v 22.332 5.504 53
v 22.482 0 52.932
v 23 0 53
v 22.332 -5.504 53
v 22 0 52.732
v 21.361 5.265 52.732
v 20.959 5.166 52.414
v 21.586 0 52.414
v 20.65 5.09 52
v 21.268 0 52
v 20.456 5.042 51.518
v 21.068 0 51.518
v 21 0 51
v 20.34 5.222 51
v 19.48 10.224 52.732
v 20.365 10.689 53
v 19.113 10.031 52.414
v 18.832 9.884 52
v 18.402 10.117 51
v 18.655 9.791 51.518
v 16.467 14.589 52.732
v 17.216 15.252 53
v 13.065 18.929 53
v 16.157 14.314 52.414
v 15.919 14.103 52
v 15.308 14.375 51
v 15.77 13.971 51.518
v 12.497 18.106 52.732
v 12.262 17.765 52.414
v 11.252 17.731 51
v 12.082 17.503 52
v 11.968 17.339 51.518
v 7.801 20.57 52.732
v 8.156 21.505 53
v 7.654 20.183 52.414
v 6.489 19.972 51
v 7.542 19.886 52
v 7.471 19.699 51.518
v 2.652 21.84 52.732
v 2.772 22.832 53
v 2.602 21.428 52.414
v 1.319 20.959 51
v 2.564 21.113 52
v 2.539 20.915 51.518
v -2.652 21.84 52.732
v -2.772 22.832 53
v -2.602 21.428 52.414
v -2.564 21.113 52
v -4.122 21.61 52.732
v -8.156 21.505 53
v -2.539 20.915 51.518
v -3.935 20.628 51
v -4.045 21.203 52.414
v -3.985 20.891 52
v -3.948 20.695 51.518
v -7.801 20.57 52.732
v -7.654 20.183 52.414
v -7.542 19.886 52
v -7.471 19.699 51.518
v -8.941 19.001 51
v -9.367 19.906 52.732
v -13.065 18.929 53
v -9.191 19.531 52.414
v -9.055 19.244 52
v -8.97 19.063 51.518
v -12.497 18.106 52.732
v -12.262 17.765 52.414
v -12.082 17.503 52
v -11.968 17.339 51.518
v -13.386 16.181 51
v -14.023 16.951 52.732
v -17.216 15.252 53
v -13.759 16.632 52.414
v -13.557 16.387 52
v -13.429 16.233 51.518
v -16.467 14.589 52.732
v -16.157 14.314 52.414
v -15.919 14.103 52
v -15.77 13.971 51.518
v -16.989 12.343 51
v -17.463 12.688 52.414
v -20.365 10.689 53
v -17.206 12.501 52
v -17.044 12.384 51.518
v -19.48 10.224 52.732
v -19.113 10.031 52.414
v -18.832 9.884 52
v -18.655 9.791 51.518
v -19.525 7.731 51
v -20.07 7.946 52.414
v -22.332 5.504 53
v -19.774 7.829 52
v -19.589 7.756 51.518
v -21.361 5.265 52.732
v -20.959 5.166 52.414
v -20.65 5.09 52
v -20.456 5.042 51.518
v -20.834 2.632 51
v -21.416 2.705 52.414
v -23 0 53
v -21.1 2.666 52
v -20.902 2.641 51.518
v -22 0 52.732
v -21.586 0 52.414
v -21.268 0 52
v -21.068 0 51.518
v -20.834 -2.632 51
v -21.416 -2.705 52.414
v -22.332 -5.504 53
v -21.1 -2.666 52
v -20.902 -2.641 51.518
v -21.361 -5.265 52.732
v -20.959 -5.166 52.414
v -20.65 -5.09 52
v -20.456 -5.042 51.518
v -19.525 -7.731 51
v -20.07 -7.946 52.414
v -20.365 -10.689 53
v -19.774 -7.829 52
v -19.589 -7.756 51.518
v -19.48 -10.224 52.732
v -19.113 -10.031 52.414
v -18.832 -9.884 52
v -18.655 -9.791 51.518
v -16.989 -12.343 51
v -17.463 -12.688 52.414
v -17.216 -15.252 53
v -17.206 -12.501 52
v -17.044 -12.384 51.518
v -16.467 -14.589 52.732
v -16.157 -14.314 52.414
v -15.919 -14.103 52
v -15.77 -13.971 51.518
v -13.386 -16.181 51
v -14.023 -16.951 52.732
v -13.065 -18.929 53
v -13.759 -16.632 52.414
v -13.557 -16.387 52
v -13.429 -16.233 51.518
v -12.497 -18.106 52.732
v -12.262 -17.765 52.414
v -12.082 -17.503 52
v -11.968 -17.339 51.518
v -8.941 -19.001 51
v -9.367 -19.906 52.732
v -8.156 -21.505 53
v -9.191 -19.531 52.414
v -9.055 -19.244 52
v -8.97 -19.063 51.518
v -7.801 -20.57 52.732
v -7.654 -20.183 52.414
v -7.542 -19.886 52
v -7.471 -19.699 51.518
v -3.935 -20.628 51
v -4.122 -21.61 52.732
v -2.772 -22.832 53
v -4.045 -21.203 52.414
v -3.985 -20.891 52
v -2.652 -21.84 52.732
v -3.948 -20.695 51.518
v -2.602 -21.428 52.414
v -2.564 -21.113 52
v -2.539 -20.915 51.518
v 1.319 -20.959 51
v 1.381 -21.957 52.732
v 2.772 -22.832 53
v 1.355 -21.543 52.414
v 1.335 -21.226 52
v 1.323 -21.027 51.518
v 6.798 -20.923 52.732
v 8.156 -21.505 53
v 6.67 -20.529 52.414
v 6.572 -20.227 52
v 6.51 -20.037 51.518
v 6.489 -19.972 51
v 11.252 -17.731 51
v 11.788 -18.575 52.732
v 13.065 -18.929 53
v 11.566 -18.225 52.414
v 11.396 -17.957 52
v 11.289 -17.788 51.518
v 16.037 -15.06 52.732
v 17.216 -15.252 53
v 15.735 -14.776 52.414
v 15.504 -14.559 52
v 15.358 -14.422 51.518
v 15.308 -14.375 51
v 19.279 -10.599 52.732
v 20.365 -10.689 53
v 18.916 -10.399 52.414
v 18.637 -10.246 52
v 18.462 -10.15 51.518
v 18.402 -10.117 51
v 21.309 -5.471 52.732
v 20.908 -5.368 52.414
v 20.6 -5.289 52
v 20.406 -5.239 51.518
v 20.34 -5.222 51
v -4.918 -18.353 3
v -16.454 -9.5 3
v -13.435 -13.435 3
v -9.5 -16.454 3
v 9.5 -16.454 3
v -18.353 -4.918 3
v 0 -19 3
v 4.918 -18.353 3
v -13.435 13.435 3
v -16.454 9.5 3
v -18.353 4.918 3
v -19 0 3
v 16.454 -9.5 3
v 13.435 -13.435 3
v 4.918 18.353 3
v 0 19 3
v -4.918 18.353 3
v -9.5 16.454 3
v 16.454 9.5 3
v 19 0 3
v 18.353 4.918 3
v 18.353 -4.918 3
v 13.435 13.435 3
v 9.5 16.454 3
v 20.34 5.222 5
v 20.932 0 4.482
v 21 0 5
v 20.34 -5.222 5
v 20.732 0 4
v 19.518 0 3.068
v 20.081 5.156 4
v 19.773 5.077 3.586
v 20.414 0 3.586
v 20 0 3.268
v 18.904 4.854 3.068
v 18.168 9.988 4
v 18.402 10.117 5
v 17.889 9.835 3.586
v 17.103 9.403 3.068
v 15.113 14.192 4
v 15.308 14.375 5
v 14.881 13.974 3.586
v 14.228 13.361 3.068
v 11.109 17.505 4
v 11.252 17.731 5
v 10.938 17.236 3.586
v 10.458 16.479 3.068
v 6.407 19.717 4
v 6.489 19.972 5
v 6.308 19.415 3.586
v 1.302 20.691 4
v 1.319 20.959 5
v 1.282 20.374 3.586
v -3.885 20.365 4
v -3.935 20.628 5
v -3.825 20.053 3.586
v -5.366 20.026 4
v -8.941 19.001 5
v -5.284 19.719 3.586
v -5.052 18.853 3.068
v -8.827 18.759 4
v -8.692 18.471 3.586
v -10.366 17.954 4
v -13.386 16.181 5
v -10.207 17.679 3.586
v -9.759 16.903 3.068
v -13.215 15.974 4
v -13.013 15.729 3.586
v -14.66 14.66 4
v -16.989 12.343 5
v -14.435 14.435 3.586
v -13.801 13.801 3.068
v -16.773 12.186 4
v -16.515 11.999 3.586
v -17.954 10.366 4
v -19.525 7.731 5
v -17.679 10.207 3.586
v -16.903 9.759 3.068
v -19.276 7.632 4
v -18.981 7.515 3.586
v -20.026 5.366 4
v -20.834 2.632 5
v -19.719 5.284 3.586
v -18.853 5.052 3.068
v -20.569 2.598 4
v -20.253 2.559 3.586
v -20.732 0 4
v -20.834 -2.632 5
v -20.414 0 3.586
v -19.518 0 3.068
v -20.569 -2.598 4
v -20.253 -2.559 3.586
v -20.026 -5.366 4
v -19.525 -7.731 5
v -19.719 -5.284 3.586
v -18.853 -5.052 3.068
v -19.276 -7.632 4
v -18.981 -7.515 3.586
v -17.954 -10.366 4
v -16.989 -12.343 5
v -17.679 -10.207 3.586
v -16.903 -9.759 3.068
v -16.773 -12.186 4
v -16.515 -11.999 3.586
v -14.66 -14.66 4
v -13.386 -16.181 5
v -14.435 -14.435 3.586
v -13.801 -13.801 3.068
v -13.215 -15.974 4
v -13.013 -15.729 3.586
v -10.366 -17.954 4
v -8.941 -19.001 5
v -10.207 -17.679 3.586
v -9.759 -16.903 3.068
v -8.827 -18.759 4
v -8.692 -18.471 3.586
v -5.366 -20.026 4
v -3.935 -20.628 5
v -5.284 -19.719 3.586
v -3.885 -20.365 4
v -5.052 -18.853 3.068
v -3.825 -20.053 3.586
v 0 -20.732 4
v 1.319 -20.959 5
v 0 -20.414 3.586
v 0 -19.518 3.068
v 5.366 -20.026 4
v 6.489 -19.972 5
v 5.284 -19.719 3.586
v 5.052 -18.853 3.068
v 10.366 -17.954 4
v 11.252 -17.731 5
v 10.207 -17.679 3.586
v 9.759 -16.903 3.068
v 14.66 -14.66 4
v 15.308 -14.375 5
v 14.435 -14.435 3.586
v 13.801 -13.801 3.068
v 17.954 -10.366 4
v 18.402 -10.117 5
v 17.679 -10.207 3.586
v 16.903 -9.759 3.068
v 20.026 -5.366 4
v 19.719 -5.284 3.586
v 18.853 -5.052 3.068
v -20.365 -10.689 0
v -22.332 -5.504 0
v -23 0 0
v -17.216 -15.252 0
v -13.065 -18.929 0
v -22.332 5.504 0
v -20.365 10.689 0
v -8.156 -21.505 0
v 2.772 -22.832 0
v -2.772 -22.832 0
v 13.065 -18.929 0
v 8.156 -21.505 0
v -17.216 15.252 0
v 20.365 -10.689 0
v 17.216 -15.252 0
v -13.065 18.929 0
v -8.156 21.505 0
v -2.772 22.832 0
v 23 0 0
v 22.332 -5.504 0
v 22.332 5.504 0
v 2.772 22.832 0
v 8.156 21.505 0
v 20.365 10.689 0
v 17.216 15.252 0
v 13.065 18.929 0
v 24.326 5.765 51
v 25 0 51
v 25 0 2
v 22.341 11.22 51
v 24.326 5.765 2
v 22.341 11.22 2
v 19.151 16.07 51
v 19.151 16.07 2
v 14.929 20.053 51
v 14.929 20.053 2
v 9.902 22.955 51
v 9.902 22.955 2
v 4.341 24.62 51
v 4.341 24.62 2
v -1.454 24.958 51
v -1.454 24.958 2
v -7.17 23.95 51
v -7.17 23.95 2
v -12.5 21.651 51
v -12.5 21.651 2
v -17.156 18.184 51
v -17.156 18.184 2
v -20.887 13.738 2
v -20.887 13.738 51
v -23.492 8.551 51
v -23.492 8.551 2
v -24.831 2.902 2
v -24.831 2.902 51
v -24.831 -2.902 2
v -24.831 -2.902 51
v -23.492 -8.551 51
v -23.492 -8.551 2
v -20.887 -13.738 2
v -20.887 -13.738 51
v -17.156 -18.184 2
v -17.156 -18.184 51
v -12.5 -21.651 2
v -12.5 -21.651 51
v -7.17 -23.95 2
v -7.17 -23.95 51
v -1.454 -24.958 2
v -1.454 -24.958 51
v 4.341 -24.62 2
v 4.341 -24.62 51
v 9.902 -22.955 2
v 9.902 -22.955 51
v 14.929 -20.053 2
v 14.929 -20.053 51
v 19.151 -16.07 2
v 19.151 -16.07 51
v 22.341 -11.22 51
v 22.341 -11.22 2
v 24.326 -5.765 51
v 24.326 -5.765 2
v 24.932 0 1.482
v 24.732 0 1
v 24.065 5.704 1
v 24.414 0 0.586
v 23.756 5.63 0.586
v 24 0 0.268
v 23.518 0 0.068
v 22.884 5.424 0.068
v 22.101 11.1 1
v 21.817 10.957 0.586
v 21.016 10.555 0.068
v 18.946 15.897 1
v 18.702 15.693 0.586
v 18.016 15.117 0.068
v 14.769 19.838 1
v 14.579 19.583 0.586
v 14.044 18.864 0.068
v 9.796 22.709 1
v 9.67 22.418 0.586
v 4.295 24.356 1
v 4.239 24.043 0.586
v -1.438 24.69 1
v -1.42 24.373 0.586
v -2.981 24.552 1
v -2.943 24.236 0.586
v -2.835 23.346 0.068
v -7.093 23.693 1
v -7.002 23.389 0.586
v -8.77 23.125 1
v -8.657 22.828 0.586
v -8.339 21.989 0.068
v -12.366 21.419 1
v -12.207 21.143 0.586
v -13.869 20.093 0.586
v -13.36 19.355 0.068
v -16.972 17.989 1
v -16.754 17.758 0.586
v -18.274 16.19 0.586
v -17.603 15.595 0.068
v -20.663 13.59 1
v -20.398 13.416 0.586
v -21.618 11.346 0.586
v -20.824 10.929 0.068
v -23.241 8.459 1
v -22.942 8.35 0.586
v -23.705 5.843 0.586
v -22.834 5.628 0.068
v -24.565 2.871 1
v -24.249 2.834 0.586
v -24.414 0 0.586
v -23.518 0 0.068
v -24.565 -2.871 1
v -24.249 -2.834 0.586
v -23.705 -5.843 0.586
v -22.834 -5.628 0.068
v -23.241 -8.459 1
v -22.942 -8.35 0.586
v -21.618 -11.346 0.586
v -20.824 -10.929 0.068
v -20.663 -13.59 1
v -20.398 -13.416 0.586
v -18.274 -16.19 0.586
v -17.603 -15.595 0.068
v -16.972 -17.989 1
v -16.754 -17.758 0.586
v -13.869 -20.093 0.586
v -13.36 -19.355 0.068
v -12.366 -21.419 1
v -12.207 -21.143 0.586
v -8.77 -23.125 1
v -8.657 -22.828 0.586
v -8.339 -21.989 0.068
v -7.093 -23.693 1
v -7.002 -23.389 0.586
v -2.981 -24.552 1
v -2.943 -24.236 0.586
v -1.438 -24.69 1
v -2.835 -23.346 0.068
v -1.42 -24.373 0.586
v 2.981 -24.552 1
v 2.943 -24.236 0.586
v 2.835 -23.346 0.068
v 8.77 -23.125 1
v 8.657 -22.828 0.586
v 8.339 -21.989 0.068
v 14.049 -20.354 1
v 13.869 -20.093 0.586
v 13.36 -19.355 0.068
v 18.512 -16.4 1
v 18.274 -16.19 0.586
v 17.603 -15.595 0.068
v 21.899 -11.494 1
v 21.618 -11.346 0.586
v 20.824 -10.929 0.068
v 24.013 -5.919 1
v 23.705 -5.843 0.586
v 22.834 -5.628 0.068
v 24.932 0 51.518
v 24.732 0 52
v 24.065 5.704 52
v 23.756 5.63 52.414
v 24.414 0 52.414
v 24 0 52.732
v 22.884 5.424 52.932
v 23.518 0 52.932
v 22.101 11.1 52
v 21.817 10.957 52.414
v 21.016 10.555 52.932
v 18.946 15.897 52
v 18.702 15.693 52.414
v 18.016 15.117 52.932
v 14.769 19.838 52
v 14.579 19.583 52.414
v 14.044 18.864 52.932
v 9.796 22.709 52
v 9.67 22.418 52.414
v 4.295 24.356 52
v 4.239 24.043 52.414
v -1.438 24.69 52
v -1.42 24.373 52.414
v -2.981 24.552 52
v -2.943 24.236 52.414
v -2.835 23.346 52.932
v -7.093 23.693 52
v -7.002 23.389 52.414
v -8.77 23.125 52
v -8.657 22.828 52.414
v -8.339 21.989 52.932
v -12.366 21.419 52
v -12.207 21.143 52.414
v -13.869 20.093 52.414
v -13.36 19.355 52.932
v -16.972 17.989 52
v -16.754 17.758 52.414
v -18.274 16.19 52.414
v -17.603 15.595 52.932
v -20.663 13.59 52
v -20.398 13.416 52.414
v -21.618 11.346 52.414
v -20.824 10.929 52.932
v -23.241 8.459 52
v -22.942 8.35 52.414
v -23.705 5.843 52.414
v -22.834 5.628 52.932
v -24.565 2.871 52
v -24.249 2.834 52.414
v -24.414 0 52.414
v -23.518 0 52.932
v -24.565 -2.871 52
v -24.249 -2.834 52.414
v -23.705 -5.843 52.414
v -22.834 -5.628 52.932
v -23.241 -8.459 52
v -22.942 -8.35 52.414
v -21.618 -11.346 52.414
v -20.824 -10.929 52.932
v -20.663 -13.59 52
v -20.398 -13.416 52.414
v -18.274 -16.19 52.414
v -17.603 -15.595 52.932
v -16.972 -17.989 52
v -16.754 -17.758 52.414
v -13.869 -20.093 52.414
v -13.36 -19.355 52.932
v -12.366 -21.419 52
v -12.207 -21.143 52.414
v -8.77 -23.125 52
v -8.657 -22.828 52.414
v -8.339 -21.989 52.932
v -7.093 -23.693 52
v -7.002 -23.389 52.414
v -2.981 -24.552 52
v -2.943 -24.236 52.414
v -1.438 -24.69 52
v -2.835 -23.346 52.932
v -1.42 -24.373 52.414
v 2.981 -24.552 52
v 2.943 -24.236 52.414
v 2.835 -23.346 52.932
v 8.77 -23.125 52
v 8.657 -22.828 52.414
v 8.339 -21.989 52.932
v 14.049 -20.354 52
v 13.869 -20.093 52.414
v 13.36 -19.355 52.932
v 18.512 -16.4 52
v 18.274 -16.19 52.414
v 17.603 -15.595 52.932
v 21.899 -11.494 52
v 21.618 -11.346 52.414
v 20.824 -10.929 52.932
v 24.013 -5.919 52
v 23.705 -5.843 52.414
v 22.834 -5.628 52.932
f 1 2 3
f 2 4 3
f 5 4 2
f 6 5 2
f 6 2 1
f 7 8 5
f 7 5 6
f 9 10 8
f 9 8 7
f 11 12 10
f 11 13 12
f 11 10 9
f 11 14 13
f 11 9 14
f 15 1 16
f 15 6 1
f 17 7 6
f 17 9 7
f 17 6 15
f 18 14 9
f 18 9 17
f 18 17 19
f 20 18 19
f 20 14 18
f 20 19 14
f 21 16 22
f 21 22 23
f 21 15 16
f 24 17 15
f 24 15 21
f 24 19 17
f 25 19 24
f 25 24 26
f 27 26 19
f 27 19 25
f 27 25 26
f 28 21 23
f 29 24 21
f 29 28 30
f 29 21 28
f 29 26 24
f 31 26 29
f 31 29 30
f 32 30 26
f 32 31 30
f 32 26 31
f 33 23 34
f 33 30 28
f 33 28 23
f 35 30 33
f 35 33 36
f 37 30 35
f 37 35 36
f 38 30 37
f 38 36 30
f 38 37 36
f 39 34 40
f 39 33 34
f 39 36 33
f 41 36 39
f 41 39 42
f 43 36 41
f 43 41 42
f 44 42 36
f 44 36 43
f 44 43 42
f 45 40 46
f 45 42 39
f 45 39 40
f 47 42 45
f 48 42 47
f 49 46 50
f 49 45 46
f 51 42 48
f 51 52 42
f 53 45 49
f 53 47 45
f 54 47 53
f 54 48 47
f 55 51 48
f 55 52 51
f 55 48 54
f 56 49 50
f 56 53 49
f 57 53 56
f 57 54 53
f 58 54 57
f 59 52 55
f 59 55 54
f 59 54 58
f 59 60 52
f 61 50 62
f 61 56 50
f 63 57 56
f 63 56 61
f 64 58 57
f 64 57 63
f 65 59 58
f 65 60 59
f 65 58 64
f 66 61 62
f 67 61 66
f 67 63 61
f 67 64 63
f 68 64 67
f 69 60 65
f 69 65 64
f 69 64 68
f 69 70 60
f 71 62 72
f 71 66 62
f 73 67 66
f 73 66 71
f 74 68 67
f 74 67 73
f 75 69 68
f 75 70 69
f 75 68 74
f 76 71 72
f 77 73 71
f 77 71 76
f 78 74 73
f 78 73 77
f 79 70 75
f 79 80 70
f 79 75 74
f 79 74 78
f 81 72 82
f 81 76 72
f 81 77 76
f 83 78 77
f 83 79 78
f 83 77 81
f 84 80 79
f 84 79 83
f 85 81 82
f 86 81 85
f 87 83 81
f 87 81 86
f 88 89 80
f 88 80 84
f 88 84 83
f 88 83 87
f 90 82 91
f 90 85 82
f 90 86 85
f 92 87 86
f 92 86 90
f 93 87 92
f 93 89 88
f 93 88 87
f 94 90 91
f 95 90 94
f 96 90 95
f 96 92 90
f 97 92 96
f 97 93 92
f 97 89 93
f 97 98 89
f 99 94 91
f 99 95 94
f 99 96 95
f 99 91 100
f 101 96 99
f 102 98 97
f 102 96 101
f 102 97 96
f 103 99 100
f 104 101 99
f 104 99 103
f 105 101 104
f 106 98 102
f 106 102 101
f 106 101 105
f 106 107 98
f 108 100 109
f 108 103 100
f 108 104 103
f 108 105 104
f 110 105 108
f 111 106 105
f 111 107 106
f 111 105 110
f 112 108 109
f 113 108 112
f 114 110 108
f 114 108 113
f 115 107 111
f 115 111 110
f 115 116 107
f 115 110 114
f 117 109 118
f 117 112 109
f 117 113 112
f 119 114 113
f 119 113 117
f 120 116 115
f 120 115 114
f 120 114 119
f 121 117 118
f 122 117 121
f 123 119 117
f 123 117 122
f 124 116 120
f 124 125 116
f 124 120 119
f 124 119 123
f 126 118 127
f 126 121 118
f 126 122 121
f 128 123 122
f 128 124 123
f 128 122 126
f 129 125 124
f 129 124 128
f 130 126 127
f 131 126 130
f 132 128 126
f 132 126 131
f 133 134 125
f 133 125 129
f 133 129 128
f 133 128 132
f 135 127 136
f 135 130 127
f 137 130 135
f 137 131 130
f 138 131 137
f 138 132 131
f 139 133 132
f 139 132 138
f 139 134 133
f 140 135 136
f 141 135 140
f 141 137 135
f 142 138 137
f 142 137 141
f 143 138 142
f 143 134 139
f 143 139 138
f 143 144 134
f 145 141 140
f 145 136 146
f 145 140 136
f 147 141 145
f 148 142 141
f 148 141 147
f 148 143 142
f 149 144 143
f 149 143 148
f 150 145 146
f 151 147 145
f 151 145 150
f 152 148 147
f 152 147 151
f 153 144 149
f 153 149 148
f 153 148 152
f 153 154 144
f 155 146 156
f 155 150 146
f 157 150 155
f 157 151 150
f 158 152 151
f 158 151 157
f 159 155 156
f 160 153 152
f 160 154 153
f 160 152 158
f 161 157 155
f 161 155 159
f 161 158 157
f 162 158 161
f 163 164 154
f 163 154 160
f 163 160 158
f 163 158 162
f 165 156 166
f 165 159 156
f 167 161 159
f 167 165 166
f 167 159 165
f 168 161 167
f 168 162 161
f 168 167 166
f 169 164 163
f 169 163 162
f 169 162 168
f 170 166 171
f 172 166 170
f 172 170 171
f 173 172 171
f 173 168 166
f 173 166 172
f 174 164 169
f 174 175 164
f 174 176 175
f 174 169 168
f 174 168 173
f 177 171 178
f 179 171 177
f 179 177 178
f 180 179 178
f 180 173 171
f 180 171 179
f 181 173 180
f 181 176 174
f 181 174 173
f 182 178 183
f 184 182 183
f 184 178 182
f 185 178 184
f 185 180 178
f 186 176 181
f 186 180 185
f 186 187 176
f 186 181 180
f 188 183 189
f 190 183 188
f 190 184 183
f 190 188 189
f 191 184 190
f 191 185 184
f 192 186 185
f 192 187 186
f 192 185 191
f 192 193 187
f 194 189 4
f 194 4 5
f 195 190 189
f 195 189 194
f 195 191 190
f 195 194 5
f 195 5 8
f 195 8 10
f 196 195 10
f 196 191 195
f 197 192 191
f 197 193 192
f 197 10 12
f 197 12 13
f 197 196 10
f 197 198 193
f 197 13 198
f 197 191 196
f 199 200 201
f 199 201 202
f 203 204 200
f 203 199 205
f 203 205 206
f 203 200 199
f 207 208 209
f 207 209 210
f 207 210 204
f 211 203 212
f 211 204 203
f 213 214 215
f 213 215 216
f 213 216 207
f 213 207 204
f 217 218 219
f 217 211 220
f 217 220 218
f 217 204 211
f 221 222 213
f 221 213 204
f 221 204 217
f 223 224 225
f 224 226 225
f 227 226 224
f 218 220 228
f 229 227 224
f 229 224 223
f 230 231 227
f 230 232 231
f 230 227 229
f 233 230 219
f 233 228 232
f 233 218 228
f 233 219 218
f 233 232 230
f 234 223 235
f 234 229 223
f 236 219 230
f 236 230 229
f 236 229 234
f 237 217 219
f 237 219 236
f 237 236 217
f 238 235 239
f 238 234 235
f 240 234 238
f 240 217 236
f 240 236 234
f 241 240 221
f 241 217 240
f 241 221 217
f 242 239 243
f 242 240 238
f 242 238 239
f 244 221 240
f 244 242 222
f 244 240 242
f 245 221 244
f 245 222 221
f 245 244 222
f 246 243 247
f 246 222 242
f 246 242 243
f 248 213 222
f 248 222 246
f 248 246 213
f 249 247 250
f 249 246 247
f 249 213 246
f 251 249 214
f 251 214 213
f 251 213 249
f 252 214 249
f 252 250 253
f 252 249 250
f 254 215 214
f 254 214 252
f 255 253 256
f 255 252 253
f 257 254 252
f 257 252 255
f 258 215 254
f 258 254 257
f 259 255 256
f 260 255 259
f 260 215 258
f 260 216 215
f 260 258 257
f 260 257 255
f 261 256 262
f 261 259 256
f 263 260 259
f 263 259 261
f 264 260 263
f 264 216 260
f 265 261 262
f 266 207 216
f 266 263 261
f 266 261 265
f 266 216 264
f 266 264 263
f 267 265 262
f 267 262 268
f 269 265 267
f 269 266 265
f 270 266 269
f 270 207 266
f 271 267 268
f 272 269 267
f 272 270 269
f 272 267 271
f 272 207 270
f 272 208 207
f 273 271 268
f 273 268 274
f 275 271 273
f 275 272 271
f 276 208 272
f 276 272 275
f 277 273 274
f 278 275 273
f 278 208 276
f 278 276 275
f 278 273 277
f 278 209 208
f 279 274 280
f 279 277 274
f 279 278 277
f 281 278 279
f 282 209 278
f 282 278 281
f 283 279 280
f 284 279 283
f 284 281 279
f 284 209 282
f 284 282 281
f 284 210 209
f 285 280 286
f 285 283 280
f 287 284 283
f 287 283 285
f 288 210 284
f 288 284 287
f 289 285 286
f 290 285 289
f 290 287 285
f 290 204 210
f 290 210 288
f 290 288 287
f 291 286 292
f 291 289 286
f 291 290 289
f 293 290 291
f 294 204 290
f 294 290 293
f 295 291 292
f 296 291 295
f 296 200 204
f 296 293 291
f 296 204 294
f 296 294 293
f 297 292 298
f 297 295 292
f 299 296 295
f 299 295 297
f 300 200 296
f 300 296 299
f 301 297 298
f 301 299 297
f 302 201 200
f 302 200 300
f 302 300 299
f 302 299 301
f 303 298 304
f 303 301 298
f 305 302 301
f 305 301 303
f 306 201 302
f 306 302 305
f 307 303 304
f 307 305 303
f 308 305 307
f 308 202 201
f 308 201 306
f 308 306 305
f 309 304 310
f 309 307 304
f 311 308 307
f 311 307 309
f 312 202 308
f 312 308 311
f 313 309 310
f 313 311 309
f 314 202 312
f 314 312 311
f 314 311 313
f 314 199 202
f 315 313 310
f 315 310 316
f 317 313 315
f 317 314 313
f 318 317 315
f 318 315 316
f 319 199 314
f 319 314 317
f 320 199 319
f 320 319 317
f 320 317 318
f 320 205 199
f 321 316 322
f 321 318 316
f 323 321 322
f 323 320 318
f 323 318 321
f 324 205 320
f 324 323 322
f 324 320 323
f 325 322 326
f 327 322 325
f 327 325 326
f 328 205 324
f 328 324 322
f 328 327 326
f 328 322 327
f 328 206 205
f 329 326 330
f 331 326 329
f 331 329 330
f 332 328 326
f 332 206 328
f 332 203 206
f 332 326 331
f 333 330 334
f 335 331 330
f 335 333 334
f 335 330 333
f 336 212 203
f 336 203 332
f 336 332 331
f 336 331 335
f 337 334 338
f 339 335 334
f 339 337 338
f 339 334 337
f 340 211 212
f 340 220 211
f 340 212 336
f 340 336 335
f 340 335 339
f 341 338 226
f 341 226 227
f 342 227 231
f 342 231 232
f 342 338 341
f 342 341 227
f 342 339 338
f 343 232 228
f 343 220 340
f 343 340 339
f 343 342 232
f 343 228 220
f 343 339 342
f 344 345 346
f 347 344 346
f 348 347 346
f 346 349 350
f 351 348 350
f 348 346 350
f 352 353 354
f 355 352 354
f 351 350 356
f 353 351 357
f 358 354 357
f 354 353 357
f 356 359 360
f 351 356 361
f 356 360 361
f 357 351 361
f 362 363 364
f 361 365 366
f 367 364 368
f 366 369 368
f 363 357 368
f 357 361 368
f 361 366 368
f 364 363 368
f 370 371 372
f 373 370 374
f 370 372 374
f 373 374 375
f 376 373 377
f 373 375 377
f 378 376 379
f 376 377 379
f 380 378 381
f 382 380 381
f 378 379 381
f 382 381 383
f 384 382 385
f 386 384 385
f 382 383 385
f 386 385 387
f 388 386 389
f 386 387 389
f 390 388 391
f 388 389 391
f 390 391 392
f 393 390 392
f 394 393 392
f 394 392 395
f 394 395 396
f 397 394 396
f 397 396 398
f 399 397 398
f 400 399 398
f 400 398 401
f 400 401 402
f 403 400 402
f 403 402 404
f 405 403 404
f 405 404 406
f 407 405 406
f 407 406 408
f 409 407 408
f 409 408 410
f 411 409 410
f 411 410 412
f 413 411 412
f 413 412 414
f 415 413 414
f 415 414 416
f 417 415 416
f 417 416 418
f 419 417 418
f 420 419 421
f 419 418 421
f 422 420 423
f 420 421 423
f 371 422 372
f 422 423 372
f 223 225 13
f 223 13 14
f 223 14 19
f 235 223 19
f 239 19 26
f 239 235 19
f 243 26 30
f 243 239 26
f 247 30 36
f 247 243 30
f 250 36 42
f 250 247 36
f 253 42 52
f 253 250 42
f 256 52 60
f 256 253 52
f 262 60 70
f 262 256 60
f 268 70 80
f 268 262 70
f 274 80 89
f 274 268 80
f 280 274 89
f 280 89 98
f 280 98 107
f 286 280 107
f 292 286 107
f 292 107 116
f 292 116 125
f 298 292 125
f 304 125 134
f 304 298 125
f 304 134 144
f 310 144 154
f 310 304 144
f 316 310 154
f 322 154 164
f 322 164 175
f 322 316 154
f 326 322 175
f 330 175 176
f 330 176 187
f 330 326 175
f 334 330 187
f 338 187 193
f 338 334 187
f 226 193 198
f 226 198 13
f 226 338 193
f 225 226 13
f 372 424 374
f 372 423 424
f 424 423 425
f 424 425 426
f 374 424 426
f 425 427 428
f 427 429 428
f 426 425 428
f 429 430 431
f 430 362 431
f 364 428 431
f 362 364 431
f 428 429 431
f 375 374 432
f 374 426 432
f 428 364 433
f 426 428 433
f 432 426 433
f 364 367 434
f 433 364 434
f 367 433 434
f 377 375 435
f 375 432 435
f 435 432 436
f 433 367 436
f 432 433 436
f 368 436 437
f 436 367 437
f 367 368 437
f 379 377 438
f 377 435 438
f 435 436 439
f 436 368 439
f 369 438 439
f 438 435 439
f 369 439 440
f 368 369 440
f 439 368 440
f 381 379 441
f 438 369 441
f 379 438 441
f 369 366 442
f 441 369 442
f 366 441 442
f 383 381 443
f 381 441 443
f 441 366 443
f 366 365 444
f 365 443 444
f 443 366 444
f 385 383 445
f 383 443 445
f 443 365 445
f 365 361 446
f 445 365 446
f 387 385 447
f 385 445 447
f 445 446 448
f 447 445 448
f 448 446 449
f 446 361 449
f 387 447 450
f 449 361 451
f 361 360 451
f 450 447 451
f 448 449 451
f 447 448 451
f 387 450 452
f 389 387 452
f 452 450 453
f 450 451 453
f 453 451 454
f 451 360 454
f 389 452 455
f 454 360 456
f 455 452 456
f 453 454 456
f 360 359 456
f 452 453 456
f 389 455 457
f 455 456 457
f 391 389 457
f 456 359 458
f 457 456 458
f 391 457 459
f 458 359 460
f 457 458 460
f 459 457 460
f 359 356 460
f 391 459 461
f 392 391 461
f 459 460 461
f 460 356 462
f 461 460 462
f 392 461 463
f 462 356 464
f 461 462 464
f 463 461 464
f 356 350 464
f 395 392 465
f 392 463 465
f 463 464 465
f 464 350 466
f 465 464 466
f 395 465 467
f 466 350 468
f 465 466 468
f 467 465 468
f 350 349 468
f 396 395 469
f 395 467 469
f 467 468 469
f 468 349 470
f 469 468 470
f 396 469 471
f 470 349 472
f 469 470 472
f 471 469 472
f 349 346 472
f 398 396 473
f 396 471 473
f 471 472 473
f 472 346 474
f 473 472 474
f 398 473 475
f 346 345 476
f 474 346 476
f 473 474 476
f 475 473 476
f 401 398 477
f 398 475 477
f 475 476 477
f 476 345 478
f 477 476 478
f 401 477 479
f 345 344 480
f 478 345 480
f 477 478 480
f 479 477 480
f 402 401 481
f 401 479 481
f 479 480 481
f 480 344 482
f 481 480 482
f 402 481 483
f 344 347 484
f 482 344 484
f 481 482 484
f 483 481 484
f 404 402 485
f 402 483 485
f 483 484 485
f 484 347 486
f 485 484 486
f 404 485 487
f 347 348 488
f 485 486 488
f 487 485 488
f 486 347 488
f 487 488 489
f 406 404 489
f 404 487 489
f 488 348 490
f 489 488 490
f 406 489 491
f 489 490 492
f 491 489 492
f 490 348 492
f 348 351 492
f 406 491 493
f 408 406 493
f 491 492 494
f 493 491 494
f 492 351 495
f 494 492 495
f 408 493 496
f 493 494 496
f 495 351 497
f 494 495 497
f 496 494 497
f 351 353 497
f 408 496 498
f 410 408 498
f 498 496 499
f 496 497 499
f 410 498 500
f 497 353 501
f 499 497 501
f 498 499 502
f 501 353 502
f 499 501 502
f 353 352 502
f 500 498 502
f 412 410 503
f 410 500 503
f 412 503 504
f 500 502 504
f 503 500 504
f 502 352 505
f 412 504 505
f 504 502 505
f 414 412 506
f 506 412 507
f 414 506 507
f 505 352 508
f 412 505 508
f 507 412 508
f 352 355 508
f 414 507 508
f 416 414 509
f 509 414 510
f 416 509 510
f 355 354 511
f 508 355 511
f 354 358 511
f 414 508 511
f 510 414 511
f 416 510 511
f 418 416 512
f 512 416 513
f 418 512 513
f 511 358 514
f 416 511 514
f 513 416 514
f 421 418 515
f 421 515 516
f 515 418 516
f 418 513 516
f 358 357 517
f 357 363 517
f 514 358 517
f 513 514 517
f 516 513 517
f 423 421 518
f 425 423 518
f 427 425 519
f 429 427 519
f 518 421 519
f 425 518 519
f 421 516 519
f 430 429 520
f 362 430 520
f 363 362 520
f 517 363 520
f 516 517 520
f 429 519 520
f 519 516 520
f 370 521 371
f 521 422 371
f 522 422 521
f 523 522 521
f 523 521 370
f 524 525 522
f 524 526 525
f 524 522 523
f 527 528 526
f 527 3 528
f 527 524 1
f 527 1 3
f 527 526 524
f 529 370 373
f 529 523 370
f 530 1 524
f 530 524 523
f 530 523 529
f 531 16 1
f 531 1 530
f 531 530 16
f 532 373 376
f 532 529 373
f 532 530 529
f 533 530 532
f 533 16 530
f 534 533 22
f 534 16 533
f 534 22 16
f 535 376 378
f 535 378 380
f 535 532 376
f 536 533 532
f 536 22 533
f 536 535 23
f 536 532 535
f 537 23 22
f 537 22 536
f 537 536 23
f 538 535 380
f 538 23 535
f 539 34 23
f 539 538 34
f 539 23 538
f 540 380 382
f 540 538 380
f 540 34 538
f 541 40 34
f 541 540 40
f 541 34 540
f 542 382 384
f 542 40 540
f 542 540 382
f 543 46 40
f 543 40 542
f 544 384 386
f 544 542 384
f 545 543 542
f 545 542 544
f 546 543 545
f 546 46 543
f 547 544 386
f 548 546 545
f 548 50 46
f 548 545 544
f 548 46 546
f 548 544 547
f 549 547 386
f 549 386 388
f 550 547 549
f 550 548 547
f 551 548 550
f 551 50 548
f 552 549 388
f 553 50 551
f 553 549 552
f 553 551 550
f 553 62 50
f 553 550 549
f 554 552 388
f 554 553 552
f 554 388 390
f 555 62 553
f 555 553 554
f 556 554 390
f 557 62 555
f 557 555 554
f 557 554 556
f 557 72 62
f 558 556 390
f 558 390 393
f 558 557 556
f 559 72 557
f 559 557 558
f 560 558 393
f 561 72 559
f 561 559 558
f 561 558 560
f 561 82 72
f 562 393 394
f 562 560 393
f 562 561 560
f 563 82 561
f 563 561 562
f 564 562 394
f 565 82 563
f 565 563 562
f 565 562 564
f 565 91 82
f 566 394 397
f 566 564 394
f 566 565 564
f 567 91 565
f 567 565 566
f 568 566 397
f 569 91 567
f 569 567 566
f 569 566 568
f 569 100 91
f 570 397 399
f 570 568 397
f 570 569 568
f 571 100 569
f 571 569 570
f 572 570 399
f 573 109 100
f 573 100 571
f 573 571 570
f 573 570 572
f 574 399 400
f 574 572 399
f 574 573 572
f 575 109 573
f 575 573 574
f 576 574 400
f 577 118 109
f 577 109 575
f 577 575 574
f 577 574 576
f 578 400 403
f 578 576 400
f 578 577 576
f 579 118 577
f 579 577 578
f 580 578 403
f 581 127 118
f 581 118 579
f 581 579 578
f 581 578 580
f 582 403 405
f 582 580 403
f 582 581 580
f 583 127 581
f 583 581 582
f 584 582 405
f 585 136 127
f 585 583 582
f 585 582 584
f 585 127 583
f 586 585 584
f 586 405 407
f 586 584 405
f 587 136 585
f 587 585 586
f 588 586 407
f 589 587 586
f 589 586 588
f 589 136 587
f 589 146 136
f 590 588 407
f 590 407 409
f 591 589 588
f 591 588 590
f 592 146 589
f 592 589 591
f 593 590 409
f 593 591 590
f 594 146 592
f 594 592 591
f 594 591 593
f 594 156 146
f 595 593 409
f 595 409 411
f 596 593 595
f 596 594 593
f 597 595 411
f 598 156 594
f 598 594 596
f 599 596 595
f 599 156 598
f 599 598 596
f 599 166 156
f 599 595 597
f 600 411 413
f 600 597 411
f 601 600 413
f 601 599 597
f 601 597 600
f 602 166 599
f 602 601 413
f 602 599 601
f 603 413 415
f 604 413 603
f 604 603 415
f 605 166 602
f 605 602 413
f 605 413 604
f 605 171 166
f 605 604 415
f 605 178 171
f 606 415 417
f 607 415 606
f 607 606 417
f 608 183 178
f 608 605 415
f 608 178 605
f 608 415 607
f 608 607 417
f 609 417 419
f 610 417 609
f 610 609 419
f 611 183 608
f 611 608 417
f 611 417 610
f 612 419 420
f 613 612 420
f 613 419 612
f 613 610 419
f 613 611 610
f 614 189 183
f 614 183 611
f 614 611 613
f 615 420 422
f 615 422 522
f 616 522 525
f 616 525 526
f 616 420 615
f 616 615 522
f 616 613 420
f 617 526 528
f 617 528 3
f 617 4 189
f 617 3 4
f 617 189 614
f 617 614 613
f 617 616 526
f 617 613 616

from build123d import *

# Parameters (mm, degrees)
F0_R     = 25
F1_DEPTH = 3
F2_R     = 25
F2_R_2   = 21
F3_DEPTH = 50
F4_R     = 1.99999
F5_R     = 2


# Not quite as in the source:
# - a fillet or chamfer is up to 0.001 mm smaller than in the source, because OpenCascade refuses the exact size


with BuildPart() as f1:
    # F0 (on Top) → F1 (new body)
    with BuildSketch(Plane.XY):
        Circle(F0_R)
    extrude(amount=F1_DEPTH)

    # F2 (on face) → F3 (join)
    with BuildSketch(Plane.XY.offset(3)):
        Circle(F2_R)
        Circle(F2_R_2, mode=Mode.SUBTRACT)
    extrude(amount=F3_DEPTH)

    # F4 (radius 2 in the source; OpenCascade refuses exactly that, so slightly less here)
    f4_edges = [f1.edges().sort_by_distance(p)[0] for p in [
        (-25, 0, 53),
        (-21, 0, 53),
        (-21, 0, 3),
    ]]
    fillet(f4_edges, radius=F4_R)

    # F5
    f5_edges = [f1.edges().sort_by_distance(p)[0] for p in [
        (-25, 0, 0),
    ]]
    fillet(f5_edges, radius=F5_R)


solid = f1.part
